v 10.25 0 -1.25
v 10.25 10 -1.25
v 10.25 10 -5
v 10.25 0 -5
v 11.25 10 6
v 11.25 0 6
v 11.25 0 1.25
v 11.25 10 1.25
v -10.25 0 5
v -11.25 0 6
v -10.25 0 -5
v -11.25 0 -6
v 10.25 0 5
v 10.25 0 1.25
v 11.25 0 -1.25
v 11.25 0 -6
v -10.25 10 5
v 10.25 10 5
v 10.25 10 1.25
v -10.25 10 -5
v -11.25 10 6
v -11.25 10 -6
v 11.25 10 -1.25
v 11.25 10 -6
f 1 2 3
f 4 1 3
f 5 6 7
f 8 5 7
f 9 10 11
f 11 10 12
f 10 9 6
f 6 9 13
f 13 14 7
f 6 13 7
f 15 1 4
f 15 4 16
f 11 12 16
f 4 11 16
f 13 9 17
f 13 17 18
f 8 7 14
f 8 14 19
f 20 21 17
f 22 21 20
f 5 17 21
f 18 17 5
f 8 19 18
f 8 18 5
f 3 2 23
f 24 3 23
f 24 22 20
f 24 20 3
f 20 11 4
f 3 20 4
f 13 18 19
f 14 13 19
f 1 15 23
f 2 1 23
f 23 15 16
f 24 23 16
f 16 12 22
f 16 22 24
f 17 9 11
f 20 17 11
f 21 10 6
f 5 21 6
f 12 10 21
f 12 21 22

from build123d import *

# Parameters (mm, degrees)
SKETCH_1_W          = 22.5
SKETCH_1_H          = 12
SKETCH_1_W_2        = 20.5
SKETCH_1_H_2        = 10
EXTRUDE_1_DEPTH     = 10
SKETCH_2_W          = 2.5
SKETCH_2_H          = 10
CUT_EXTRUDE_1_DEPTH = 5


with BuildPart() as part:
    # 草图1 → 凸台-拉伸1 (new body)
    with BuildSketch(Plane(origin=(0, 0, 0), x_dir=(1, 0, 0), z_dir=(0, 1, 0))):
        Rectangle(SKETCH_1_W, SKETCH_1_H)
        Rectangle(SKETCH_1_W_2, SKETCH_1_H_2, mode=Mode.SUBTRACT)
    extrude(amount=EXTRUDE_1_DEPTH)

    # 草图2 → 切除-拉伸1 (cut)
    with BuildSketch(Plane(origin=(11.25, 0, 0), x_dir=(0, 0, -1), z_dir=(1, 0, 0))):
        with Locations((0, 5)):
            Rectangle(SKETCH_2_W, SKETCH_2_H)
    extrude(amount=-CUT_EXTRUDE_1_DEPTH, mode=Mode.SUBTRACT)


solid = part.part
